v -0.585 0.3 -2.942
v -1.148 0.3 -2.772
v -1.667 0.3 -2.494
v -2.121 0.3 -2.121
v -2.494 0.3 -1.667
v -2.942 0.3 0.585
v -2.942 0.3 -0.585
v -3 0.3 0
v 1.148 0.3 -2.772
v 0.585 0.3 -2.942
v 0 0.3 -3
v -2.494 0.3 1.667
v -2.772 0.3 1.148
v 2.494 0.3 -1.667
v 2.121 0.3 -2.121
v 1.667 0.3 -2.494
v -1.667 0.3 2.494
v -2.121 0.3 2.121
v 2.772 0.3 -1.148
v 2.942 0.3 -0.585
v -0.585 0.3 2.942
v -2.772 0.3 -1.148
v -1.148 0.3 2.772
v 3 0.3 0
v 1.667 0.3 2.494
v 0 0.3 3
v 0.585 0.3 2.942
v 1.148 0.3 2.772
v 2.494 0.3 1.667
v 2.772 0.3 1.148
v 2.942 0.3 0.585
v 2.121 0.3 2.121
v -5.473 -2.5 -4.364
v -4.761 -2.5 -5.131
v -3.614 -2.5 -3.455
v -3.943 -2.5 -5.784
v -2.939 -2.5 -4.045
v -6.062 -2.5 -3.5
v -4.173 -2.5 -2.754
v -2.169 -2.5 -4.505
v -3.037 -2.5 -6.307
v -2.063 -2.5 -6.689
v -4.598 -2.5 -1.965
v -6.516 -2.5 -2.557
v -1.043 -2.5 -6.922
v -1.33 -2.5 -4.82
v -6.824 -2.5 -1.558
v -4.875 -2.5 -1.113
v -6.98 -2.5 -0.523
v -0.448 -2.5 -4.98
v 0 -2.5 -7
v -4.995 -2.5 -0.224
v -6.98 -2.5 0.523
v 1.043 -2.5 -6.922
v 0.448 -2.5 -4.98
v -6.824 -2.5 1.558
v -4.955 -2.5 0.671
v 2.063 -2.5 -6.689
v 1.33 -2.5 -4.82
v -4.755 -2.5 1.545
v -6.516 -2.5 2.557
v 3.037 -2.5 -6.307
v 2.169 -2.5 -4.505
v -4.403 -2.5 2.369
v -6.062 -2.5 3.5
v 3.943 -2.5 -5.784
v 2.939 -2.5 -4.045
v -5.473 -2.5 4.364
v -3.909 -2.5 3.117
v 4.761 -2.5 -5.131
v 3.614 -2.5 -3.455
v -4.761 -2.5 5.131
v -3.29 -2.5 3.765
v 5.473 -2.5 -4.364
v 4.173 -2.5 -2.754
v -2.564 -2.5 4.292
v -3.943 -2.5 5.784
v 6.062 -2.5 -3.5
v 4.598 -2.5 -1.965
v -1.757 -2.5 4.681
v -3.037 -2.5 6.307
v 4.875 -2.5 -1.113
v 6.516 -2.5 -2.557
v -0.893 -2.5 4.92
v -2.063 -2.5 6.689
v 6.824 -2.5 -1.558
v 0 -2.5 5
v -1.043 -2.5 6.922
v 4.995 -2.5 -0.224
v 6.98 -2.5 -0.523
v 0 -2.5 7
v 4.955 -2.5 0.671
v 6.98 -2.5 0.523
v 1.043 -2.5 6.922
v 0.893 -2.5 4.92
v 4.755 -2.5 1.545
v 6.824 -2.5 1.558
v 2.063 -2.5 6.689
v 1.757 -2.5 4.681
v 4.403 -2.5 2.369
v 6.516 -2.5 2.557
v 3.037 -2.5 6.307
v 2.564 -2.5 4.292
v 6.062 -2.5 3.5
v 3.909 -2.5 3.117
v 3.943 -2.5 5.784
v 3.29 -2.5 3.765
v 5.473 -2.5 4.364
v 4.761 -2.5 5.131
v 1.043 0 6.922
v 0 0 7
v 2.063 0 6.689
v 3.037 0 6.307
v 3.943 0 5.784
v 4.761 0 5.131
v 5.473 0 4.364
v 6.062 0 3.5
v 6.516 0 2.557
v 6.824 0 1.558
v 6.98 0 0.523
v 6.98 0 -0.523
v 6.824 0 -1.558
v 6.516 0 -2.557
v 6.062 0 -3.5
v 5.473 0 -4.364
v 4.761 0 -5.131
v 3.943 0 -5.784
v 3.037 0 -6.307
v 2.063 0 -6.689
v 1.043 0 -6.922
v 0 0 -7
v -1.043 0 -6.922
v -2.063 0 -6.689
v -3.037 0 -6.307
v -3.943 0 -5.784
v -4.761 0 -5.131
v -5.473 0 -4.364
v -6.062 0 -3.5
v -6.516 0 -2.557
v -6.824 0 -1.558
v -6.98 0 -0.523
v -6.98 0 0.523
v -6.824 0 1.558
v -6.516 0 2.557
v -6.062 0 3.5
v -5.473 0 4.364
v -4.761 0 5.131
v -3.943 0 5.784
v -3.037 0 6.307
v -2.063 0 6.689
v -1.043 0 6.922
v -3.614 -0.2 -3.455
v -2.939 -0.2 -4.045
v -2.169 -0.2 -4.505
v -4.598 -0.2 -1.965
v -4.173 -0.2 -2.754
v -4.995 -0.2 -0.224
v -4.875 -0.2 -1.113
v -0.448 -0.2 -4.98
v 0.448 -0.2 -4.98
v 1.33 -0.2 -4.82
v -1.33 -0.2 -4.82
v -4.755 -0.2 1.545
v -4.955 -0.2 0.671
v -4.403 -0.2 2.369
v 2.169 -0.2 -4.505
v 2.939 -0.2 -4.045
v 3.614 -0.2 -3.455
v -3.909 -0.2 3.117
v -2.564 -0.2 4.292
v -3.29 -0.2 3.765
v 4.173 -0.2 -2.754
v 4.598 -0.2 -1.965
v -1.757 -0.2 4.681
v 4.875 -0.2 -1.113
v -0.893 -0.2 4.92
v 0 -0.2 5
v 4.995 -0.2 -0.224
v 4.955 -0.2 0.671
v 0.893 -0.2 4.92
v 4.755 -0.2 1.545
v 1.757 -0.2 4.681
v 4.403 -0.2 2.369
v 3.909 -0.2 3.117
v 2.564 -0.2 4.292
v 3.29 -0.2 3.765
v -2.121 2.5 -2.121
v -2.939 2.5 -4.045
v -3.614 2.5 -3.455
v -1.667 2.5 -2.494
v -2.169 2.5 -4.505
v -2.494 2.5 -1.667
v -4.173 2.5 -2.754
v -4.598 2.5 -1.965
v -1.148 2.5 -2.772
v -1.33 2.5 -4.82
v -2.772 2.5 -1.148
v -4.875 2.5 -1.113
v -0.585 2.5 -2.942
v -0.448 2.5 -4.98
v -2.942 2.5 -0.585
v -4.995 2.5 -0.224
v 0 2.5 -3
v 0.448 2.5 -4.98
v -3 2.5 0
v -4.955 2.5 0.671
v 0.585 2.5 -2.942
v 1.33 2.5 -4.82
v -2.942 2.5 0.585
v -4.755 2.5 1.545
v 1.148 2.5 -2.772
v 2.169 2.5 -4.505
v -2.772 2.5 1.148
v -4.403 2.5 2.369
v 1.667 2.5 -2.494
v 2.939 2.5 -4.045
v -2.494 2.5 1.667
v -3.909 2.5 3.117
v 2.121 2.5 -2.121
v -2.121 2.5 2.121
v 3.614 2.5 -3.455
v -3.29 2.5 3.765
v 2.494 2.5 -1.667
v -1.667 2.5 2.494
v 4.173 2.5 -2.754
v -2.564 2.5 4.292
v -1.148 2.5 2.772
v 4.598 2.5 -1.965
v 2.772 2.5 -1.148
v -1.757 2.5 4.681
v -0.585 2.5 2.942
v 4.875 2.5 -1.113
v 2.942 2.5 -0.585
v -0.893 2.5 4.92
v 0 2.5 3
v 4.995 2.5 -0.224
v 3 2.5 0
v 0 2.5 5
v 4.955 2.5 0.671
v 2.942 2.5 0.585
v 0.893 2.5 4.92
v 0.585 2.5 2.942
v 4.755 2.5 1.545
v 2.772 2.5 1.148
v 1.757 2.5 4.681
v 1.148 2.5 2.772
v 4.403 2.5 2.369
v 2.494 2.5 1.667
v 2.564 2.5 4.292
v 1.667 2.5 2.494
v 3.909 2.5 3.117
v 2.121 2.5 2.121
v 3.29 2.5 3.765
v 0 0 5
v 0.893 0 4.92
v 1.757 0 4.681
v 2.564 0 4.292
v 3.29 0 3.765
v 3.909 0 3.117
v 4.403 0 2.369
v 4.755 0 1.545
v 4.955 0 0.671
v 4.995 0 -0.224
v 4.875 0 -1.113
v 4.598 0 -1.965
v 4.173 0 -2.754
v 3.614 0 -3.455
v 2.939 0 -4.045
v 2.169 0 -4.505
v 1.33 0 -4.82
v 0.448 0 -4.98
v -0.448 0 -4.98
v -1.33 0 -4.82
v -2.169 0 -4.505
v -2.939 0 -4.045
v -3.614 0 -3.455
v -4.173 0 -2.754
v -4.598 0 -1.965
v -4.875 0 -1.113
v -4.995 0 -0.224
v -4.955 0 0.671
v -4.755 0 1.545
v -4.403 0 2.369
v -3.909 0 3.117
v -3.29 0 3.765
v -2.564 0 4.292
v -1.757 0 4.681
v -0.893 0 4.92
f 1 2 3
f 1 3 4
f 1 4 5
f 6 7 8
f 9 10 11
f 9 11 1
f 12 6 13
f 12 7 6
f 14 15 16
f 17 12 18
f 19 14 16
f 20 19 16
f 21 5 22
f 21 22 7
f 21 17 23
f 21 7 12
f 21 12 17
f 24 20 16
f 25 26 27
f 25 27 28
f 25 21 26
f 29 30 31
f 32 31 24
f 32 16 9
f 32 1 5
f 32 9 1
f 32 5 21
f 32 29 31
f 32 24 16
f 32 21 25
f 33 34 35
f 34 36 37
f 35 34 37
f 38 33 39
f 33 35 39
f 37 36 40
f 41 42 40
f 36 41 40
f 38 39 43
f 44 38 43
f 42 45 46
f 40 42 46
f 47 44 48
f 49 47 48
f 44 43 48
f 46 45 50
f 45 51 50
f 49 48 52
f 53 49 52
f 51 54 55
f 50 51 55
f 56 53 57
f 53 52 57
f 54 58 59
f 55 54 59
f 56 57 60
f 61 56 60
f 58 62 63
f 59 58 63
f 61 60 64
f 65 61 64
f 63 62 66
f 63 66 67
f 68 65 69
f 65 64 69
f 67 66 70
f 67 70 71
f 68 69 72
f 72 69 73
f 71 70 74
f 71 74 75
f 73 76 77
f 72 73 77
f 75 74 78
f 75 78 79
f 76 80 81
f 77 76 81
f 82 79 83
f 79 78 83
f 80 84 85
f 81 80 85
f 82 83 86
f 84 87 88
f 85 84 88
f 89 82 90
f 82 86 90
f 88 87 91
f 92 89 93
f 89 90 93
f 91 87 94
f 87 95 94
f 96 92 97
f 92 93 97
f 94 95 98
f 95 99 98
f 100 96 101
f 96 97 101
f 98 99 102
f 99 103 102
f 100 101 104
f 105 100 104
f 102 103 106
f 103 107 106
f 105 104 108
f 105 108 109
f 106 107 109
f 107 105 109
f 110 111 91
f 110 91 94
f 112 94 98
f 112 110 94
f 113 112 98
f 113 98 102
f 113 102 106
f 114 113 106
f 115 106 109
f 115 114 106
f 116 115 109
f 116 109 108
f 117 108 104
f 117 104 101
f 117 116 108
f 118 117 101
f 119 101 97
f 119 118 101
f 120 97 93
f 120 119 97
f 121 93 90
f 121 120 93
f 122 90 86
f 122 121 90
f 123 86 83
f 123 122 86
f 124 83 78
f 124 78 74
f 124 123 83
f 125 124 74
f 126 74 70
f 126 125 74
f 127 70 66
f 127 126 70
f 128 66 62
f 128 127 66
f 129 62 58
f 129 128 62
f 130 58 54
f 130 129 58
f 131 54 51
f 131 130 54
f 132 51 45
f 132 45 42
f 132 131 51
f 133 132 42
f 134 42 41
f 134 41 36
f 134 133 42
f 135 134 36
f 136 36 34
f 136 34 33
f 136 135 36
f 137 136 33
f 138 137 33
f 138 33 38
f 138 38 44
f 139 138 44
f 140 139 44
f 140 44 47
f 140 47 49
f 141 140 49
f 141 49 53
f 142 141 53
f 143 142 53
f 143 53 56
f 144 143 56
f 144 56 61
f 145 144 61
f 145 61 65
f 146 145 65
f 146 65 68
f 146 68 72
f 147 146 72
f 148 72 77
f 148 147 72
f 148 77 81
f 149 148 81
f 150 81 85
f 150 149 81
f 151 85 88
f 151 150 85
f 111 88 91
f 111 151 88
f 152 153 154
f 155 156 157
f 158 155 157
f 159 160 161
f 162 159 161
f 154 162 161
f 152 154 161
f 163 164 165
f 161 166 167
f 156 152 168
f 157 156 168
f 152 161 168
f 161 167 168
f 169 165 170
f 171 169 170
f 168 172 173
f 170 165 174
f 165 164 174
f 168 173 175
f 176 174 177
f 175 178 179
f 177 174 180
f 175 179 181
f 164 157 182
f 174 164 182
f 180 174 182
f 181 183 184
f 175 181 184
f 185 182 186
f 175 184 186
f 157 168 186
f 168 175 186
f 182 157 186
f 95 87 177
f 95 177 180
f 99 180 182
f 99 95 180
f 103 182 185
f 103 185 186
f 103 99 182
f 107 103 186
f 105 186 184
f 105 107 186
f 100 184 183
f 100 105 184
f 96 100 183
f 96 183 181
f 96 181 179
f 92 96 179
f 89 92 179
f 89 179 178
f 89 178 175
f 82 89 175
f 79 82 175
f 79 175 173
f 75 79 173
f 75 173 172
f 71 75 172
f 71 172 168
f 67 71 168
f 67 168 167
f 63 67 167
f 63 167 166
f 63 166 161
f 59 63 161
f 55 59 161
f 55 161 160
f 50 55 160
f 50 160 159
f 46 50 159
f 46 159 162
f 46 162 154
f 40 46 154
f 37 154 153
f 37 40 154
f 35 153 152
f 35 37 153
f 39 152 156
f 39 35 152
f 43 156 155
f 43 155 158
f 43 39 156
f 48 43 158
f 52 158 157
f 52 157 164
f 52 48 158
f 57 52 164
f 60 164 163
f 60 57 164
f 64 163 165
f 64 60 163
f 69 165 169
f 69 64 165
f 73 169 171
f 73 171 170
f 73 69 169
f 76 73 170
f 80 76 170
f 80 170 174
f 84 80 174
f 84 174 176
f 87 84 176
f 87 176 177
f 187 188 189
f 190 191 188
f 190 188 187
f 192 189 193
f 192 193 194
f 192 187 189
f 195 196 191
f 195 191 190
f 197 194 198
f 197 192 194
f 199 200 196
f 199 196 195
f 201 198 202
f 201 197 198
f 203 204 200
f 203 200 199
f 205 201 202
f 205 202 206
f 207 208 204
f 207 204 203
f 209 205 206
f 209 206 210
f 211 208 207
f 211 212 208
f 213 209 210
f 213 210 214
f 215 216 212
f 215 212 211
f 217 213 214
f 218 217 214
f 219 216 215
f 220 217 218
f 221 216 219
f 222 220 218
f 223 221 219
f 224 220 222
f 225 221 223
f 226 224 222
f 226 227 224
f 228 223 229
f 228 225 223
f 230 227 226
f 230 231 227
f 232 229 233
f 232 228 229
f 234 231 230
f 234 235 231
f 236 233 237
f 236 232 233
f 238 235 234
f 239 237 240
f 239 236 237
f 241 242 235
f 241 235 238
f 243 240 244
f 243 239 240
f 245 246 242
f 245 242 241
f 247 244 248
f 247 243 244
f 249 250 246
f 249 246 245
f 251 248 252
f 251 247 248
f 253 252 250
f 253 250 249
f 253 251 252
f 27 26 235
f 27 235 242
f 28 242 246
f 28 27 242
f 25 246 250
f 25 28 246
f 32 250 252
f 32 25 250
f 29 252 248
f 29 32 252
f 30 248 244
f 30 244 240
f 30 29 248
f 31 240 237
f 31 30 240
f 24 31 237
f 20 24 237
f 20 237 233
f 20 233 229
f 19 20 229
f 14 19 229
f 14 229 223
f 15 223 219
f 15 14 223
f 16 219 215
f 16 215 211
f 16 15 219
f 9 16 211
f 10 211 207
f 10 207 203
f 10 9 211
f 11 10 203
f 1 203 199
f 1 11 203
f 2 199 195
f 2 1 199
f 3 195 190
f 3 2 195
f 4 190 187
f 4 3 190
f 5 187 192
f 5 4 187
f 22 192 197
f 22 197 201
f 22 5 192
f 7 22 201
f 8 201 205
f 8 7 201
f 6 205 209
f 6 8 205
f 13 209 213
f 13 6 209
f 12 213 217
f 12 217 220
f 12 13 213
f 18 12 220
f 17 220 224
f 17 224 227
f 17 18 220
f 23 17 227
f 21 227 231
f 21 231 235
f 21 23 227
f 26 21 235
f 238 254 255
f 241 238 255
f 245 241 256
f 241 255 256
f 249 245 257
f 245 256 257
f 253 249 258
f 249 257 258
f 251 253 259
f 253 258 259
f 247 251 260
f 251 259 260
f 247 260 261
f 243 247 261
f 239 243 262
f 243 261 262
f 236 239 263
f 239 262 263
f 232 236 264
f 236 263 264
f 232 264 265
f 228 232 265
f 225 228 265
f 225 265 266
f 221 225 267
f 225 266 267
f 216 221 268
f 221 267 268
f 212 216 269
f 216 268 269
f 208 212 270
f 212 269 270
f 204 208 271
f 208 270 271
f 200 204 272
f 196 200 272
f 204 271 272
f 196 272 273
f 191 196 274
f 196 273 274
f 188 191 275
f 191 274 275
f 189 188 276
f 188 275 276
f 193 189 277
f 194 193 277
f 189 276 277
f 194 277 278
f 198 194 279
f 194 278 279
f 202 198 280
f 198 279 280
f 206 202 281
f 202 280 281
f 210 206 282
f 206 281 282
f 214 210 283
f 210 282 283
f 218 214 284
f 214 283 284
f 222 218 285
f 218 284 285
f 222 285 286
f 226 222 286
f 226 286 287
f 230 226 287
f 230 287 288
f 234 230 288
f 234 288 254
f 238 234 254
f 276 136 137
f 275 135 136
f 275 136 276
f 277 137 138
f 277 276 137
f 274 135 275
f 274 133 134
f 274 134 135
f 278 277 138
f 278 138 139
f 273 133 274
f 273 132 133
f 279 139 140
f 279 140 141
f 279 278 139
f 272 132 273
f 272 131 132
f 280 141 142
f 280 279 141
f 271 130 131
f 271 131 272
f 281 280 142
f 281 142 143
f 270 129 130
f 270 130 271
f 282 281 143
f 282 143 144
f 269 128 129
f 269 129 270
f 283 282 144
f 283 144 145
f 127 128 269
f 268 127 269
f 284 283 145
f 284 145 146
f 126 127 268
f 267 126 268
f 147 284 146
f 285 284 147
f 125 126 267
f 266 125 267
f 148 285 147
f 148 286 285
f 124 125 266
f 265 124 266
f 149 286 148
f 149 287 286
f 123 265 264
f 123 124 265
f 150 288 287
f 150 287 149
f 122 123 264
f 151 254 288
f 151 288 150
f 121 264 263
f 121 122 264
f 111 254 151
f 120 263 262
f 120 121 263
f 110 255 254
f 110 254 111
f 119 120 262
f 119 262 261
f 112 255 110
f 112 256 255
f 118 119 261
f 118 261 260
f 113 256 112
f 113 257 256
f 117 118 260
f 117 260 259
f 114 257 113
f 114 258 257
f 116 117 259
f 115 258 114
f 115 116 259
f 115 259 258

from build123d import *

# Parameters (mm, degrees)
MAGNET_OUTER_DIM_R  = 5
BOSS_EXTRUDE7_DEPTH = 2.5
CUT_EXTRUDE1_START  = 0.3
MAGNET_DIM_R        = 3
CUT_EXTRUDE1_DEPTH  = 2.2
MOTOTR_OUTER_DIM_R  = 7
BOSS_EXTRUDE8_DEPTH = 2.5
CUT_EXTRUDE4_START  = -3.4
MOTOR_DIM_R         = 5
CUT_EXTRUDE4_DEPTH  = 3.2


with BuildPart() as part:
    # magnet_outer_dim → Boss-Extrude7 (new body)
    with BuildSketch(Plane(origin=(0, 0, 0), x_dir=(1, 0, 0), z_dir=(0, 1, 0))):
        with Locations(Location((0, 0, 0), (0, 0, 270))):
            Circle(MAGNET_OUTER_DIM_R)
    extrude(amount=BOSS_EXTRUDE7_DEPTH)

    # magnet_dim → Cut-Extrude1 (cut)
    with BuildSketch(Plane(origin=(0, 0, 0), x_dir=(1, 0, 0), z_dir=(0, 1, 0)).offset(CUT_EXTRUDE1_START)):
        with Locations(Location((0, 0, 0), (0, 0, 270))):
            Circle(MAGNET_DIM_R)
    extrude(amount=CUT_EXTRUDE1_DEPTH, mode=Mode.SUBTRACT)

    # mototr_outer_dim → Boss-Extrude8 (add)
    with BuildSketch(Plane(origin=(0, 0, 0), x_dir=(1, 0, 0), z_dir=(0, 1, 0))):
        with Locations(Location((0, 0, 0), (0, 0, 270))):
            Circle(MOTOTR_OUTER_DIM_R)
    extrude(amount=-BOSS_EXTRUDE8_DEPTH)

    # motor_dim → Cut-Extrude4 (cut)
    with BuildSketch(Plane(origin=(0, 0, 0), x_dir=(1, 0, 0), z_dir=(0, 1, 0)).offset(CUT_EXTRUDE4_START)):
        with Locations(Location((0, 0, 0), (0, 0, 270))):
            Circle(MOTOR_DIM_R)
    extrude(amount=CUT_EXTRUDE4_DEPTH, mode=Mode.SUBTRACT)


solid = part.part
